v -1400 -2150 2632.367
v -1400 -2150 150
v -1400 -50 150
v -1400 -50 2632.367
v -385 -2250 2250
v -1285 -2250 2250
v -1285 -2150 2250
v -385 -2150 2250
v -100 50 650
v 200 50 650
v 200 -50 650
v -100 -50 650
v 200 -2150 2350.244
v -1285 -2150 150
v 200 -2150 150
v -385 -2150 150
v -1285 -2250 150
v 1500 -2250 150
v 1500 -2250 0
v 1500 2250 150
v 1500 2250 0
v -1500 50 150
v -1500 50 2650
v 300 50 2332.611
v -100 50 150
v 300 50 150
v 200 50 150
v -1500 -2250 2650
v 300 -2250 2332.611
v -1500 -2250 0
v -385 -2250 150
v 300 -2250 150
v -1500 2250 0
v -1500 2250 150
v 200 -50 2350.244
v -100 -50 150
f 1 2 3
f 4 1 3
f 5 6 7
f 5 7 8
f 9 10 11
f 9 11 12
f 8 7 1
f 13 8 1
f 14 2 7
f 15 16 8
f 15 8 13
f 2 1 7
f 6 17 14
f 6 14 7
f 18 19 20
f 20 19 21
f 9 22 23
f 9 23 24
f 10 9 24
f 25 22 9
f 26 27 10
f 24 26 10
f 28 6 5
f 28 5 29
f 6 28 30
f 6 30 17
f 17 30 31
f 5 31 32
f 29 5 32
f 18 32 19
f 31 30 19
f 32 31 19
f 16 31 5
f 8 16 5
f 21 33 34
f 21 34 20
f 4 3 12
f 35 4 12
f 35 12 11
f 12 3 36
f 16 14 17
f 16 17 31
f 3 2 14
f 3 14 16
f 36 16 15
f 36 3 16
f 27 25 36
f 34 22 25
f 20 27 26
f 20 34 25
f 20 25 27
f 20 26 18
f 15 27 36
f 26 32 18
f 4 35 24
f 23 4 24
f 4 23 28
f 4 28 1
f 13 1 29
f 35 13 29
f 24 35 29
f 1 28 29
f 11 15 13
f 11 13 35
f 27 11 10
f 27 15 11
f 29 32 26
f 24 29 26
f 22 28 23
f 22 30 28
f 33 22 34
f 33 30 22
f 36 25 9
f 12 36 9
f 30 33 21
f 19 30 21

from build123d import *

# Parameters (mm, degrees)
F0_W      = 3000
F0_H      = 4500
F1_DEPTH  = 150
F2_W      = 1800
F2_H      = 2300
F2_W_2    = 1600
F2_H_2    = 2100
F4_DEPTH  = 2500
F6_DEPTH  = 2300
F7_W      = 900
F7_H      = 2100
F8_DEPTH  = 800
F9_W      = 300
F9_H      = 500
F10_DEPTH = 100


# Not quite as in the source:
# - a feature of the source that left no trace in its solid (it failed there, or was rolled back) is left out


with BuildPart() as f1:
    # F0 (on Top) → F1 (new body)
    with BuildSketch(Plane.XY):
        Rectangle(F0_W, F0_H)
    extrude(amount=F1_DEPTH)

    # F2 (on face) → F4 (join)
    with BuildSketch(Plane.XY.offset(150)):
        with Locations((-600, -1100)):
            Rectangle(F2_W, F2_H)
        with Locations((-600, -1100)):
            Rectangle(F2_W_2, F2_H_2, mode=Mode.SUBTRACT)
    extrude(amount=F4_DEPTH)

    # F5 (on face) → F6 (cut, through all)
    with BuildSketch(Plane.XZ.offset(2250)):
        Polygon((300, 2650), (-1500, 2650), (300, 2332.6114347248), align=None)
    extrude(amount=-F6_DEPTH, mode=Mode.SUBTRACT)

    # F7 (on face) → F8 (cut)
    with BuildSketch(Plane.XZ.offset(2250)):
        with Locations((-835, 1200)):
            Rectangle(F7_W, F7_H)
    extrude(amount=-F8_DEPTH, mode=Mode.SUBTRACT)

    # F9 (on face) → F10 (cut, through all)
    with BuildSketch(Plane(origin=(0, 50, 0), x_dir=(-1, 0, 0), z_dir=(0, 1, 0))):
        with Locations((-50, 400)):
            Rectangle(F9_W, F9_H)
    extrude(amount=-F10_DEPTH, mode=Mode.SUBTRACT)


solid = f1.part
